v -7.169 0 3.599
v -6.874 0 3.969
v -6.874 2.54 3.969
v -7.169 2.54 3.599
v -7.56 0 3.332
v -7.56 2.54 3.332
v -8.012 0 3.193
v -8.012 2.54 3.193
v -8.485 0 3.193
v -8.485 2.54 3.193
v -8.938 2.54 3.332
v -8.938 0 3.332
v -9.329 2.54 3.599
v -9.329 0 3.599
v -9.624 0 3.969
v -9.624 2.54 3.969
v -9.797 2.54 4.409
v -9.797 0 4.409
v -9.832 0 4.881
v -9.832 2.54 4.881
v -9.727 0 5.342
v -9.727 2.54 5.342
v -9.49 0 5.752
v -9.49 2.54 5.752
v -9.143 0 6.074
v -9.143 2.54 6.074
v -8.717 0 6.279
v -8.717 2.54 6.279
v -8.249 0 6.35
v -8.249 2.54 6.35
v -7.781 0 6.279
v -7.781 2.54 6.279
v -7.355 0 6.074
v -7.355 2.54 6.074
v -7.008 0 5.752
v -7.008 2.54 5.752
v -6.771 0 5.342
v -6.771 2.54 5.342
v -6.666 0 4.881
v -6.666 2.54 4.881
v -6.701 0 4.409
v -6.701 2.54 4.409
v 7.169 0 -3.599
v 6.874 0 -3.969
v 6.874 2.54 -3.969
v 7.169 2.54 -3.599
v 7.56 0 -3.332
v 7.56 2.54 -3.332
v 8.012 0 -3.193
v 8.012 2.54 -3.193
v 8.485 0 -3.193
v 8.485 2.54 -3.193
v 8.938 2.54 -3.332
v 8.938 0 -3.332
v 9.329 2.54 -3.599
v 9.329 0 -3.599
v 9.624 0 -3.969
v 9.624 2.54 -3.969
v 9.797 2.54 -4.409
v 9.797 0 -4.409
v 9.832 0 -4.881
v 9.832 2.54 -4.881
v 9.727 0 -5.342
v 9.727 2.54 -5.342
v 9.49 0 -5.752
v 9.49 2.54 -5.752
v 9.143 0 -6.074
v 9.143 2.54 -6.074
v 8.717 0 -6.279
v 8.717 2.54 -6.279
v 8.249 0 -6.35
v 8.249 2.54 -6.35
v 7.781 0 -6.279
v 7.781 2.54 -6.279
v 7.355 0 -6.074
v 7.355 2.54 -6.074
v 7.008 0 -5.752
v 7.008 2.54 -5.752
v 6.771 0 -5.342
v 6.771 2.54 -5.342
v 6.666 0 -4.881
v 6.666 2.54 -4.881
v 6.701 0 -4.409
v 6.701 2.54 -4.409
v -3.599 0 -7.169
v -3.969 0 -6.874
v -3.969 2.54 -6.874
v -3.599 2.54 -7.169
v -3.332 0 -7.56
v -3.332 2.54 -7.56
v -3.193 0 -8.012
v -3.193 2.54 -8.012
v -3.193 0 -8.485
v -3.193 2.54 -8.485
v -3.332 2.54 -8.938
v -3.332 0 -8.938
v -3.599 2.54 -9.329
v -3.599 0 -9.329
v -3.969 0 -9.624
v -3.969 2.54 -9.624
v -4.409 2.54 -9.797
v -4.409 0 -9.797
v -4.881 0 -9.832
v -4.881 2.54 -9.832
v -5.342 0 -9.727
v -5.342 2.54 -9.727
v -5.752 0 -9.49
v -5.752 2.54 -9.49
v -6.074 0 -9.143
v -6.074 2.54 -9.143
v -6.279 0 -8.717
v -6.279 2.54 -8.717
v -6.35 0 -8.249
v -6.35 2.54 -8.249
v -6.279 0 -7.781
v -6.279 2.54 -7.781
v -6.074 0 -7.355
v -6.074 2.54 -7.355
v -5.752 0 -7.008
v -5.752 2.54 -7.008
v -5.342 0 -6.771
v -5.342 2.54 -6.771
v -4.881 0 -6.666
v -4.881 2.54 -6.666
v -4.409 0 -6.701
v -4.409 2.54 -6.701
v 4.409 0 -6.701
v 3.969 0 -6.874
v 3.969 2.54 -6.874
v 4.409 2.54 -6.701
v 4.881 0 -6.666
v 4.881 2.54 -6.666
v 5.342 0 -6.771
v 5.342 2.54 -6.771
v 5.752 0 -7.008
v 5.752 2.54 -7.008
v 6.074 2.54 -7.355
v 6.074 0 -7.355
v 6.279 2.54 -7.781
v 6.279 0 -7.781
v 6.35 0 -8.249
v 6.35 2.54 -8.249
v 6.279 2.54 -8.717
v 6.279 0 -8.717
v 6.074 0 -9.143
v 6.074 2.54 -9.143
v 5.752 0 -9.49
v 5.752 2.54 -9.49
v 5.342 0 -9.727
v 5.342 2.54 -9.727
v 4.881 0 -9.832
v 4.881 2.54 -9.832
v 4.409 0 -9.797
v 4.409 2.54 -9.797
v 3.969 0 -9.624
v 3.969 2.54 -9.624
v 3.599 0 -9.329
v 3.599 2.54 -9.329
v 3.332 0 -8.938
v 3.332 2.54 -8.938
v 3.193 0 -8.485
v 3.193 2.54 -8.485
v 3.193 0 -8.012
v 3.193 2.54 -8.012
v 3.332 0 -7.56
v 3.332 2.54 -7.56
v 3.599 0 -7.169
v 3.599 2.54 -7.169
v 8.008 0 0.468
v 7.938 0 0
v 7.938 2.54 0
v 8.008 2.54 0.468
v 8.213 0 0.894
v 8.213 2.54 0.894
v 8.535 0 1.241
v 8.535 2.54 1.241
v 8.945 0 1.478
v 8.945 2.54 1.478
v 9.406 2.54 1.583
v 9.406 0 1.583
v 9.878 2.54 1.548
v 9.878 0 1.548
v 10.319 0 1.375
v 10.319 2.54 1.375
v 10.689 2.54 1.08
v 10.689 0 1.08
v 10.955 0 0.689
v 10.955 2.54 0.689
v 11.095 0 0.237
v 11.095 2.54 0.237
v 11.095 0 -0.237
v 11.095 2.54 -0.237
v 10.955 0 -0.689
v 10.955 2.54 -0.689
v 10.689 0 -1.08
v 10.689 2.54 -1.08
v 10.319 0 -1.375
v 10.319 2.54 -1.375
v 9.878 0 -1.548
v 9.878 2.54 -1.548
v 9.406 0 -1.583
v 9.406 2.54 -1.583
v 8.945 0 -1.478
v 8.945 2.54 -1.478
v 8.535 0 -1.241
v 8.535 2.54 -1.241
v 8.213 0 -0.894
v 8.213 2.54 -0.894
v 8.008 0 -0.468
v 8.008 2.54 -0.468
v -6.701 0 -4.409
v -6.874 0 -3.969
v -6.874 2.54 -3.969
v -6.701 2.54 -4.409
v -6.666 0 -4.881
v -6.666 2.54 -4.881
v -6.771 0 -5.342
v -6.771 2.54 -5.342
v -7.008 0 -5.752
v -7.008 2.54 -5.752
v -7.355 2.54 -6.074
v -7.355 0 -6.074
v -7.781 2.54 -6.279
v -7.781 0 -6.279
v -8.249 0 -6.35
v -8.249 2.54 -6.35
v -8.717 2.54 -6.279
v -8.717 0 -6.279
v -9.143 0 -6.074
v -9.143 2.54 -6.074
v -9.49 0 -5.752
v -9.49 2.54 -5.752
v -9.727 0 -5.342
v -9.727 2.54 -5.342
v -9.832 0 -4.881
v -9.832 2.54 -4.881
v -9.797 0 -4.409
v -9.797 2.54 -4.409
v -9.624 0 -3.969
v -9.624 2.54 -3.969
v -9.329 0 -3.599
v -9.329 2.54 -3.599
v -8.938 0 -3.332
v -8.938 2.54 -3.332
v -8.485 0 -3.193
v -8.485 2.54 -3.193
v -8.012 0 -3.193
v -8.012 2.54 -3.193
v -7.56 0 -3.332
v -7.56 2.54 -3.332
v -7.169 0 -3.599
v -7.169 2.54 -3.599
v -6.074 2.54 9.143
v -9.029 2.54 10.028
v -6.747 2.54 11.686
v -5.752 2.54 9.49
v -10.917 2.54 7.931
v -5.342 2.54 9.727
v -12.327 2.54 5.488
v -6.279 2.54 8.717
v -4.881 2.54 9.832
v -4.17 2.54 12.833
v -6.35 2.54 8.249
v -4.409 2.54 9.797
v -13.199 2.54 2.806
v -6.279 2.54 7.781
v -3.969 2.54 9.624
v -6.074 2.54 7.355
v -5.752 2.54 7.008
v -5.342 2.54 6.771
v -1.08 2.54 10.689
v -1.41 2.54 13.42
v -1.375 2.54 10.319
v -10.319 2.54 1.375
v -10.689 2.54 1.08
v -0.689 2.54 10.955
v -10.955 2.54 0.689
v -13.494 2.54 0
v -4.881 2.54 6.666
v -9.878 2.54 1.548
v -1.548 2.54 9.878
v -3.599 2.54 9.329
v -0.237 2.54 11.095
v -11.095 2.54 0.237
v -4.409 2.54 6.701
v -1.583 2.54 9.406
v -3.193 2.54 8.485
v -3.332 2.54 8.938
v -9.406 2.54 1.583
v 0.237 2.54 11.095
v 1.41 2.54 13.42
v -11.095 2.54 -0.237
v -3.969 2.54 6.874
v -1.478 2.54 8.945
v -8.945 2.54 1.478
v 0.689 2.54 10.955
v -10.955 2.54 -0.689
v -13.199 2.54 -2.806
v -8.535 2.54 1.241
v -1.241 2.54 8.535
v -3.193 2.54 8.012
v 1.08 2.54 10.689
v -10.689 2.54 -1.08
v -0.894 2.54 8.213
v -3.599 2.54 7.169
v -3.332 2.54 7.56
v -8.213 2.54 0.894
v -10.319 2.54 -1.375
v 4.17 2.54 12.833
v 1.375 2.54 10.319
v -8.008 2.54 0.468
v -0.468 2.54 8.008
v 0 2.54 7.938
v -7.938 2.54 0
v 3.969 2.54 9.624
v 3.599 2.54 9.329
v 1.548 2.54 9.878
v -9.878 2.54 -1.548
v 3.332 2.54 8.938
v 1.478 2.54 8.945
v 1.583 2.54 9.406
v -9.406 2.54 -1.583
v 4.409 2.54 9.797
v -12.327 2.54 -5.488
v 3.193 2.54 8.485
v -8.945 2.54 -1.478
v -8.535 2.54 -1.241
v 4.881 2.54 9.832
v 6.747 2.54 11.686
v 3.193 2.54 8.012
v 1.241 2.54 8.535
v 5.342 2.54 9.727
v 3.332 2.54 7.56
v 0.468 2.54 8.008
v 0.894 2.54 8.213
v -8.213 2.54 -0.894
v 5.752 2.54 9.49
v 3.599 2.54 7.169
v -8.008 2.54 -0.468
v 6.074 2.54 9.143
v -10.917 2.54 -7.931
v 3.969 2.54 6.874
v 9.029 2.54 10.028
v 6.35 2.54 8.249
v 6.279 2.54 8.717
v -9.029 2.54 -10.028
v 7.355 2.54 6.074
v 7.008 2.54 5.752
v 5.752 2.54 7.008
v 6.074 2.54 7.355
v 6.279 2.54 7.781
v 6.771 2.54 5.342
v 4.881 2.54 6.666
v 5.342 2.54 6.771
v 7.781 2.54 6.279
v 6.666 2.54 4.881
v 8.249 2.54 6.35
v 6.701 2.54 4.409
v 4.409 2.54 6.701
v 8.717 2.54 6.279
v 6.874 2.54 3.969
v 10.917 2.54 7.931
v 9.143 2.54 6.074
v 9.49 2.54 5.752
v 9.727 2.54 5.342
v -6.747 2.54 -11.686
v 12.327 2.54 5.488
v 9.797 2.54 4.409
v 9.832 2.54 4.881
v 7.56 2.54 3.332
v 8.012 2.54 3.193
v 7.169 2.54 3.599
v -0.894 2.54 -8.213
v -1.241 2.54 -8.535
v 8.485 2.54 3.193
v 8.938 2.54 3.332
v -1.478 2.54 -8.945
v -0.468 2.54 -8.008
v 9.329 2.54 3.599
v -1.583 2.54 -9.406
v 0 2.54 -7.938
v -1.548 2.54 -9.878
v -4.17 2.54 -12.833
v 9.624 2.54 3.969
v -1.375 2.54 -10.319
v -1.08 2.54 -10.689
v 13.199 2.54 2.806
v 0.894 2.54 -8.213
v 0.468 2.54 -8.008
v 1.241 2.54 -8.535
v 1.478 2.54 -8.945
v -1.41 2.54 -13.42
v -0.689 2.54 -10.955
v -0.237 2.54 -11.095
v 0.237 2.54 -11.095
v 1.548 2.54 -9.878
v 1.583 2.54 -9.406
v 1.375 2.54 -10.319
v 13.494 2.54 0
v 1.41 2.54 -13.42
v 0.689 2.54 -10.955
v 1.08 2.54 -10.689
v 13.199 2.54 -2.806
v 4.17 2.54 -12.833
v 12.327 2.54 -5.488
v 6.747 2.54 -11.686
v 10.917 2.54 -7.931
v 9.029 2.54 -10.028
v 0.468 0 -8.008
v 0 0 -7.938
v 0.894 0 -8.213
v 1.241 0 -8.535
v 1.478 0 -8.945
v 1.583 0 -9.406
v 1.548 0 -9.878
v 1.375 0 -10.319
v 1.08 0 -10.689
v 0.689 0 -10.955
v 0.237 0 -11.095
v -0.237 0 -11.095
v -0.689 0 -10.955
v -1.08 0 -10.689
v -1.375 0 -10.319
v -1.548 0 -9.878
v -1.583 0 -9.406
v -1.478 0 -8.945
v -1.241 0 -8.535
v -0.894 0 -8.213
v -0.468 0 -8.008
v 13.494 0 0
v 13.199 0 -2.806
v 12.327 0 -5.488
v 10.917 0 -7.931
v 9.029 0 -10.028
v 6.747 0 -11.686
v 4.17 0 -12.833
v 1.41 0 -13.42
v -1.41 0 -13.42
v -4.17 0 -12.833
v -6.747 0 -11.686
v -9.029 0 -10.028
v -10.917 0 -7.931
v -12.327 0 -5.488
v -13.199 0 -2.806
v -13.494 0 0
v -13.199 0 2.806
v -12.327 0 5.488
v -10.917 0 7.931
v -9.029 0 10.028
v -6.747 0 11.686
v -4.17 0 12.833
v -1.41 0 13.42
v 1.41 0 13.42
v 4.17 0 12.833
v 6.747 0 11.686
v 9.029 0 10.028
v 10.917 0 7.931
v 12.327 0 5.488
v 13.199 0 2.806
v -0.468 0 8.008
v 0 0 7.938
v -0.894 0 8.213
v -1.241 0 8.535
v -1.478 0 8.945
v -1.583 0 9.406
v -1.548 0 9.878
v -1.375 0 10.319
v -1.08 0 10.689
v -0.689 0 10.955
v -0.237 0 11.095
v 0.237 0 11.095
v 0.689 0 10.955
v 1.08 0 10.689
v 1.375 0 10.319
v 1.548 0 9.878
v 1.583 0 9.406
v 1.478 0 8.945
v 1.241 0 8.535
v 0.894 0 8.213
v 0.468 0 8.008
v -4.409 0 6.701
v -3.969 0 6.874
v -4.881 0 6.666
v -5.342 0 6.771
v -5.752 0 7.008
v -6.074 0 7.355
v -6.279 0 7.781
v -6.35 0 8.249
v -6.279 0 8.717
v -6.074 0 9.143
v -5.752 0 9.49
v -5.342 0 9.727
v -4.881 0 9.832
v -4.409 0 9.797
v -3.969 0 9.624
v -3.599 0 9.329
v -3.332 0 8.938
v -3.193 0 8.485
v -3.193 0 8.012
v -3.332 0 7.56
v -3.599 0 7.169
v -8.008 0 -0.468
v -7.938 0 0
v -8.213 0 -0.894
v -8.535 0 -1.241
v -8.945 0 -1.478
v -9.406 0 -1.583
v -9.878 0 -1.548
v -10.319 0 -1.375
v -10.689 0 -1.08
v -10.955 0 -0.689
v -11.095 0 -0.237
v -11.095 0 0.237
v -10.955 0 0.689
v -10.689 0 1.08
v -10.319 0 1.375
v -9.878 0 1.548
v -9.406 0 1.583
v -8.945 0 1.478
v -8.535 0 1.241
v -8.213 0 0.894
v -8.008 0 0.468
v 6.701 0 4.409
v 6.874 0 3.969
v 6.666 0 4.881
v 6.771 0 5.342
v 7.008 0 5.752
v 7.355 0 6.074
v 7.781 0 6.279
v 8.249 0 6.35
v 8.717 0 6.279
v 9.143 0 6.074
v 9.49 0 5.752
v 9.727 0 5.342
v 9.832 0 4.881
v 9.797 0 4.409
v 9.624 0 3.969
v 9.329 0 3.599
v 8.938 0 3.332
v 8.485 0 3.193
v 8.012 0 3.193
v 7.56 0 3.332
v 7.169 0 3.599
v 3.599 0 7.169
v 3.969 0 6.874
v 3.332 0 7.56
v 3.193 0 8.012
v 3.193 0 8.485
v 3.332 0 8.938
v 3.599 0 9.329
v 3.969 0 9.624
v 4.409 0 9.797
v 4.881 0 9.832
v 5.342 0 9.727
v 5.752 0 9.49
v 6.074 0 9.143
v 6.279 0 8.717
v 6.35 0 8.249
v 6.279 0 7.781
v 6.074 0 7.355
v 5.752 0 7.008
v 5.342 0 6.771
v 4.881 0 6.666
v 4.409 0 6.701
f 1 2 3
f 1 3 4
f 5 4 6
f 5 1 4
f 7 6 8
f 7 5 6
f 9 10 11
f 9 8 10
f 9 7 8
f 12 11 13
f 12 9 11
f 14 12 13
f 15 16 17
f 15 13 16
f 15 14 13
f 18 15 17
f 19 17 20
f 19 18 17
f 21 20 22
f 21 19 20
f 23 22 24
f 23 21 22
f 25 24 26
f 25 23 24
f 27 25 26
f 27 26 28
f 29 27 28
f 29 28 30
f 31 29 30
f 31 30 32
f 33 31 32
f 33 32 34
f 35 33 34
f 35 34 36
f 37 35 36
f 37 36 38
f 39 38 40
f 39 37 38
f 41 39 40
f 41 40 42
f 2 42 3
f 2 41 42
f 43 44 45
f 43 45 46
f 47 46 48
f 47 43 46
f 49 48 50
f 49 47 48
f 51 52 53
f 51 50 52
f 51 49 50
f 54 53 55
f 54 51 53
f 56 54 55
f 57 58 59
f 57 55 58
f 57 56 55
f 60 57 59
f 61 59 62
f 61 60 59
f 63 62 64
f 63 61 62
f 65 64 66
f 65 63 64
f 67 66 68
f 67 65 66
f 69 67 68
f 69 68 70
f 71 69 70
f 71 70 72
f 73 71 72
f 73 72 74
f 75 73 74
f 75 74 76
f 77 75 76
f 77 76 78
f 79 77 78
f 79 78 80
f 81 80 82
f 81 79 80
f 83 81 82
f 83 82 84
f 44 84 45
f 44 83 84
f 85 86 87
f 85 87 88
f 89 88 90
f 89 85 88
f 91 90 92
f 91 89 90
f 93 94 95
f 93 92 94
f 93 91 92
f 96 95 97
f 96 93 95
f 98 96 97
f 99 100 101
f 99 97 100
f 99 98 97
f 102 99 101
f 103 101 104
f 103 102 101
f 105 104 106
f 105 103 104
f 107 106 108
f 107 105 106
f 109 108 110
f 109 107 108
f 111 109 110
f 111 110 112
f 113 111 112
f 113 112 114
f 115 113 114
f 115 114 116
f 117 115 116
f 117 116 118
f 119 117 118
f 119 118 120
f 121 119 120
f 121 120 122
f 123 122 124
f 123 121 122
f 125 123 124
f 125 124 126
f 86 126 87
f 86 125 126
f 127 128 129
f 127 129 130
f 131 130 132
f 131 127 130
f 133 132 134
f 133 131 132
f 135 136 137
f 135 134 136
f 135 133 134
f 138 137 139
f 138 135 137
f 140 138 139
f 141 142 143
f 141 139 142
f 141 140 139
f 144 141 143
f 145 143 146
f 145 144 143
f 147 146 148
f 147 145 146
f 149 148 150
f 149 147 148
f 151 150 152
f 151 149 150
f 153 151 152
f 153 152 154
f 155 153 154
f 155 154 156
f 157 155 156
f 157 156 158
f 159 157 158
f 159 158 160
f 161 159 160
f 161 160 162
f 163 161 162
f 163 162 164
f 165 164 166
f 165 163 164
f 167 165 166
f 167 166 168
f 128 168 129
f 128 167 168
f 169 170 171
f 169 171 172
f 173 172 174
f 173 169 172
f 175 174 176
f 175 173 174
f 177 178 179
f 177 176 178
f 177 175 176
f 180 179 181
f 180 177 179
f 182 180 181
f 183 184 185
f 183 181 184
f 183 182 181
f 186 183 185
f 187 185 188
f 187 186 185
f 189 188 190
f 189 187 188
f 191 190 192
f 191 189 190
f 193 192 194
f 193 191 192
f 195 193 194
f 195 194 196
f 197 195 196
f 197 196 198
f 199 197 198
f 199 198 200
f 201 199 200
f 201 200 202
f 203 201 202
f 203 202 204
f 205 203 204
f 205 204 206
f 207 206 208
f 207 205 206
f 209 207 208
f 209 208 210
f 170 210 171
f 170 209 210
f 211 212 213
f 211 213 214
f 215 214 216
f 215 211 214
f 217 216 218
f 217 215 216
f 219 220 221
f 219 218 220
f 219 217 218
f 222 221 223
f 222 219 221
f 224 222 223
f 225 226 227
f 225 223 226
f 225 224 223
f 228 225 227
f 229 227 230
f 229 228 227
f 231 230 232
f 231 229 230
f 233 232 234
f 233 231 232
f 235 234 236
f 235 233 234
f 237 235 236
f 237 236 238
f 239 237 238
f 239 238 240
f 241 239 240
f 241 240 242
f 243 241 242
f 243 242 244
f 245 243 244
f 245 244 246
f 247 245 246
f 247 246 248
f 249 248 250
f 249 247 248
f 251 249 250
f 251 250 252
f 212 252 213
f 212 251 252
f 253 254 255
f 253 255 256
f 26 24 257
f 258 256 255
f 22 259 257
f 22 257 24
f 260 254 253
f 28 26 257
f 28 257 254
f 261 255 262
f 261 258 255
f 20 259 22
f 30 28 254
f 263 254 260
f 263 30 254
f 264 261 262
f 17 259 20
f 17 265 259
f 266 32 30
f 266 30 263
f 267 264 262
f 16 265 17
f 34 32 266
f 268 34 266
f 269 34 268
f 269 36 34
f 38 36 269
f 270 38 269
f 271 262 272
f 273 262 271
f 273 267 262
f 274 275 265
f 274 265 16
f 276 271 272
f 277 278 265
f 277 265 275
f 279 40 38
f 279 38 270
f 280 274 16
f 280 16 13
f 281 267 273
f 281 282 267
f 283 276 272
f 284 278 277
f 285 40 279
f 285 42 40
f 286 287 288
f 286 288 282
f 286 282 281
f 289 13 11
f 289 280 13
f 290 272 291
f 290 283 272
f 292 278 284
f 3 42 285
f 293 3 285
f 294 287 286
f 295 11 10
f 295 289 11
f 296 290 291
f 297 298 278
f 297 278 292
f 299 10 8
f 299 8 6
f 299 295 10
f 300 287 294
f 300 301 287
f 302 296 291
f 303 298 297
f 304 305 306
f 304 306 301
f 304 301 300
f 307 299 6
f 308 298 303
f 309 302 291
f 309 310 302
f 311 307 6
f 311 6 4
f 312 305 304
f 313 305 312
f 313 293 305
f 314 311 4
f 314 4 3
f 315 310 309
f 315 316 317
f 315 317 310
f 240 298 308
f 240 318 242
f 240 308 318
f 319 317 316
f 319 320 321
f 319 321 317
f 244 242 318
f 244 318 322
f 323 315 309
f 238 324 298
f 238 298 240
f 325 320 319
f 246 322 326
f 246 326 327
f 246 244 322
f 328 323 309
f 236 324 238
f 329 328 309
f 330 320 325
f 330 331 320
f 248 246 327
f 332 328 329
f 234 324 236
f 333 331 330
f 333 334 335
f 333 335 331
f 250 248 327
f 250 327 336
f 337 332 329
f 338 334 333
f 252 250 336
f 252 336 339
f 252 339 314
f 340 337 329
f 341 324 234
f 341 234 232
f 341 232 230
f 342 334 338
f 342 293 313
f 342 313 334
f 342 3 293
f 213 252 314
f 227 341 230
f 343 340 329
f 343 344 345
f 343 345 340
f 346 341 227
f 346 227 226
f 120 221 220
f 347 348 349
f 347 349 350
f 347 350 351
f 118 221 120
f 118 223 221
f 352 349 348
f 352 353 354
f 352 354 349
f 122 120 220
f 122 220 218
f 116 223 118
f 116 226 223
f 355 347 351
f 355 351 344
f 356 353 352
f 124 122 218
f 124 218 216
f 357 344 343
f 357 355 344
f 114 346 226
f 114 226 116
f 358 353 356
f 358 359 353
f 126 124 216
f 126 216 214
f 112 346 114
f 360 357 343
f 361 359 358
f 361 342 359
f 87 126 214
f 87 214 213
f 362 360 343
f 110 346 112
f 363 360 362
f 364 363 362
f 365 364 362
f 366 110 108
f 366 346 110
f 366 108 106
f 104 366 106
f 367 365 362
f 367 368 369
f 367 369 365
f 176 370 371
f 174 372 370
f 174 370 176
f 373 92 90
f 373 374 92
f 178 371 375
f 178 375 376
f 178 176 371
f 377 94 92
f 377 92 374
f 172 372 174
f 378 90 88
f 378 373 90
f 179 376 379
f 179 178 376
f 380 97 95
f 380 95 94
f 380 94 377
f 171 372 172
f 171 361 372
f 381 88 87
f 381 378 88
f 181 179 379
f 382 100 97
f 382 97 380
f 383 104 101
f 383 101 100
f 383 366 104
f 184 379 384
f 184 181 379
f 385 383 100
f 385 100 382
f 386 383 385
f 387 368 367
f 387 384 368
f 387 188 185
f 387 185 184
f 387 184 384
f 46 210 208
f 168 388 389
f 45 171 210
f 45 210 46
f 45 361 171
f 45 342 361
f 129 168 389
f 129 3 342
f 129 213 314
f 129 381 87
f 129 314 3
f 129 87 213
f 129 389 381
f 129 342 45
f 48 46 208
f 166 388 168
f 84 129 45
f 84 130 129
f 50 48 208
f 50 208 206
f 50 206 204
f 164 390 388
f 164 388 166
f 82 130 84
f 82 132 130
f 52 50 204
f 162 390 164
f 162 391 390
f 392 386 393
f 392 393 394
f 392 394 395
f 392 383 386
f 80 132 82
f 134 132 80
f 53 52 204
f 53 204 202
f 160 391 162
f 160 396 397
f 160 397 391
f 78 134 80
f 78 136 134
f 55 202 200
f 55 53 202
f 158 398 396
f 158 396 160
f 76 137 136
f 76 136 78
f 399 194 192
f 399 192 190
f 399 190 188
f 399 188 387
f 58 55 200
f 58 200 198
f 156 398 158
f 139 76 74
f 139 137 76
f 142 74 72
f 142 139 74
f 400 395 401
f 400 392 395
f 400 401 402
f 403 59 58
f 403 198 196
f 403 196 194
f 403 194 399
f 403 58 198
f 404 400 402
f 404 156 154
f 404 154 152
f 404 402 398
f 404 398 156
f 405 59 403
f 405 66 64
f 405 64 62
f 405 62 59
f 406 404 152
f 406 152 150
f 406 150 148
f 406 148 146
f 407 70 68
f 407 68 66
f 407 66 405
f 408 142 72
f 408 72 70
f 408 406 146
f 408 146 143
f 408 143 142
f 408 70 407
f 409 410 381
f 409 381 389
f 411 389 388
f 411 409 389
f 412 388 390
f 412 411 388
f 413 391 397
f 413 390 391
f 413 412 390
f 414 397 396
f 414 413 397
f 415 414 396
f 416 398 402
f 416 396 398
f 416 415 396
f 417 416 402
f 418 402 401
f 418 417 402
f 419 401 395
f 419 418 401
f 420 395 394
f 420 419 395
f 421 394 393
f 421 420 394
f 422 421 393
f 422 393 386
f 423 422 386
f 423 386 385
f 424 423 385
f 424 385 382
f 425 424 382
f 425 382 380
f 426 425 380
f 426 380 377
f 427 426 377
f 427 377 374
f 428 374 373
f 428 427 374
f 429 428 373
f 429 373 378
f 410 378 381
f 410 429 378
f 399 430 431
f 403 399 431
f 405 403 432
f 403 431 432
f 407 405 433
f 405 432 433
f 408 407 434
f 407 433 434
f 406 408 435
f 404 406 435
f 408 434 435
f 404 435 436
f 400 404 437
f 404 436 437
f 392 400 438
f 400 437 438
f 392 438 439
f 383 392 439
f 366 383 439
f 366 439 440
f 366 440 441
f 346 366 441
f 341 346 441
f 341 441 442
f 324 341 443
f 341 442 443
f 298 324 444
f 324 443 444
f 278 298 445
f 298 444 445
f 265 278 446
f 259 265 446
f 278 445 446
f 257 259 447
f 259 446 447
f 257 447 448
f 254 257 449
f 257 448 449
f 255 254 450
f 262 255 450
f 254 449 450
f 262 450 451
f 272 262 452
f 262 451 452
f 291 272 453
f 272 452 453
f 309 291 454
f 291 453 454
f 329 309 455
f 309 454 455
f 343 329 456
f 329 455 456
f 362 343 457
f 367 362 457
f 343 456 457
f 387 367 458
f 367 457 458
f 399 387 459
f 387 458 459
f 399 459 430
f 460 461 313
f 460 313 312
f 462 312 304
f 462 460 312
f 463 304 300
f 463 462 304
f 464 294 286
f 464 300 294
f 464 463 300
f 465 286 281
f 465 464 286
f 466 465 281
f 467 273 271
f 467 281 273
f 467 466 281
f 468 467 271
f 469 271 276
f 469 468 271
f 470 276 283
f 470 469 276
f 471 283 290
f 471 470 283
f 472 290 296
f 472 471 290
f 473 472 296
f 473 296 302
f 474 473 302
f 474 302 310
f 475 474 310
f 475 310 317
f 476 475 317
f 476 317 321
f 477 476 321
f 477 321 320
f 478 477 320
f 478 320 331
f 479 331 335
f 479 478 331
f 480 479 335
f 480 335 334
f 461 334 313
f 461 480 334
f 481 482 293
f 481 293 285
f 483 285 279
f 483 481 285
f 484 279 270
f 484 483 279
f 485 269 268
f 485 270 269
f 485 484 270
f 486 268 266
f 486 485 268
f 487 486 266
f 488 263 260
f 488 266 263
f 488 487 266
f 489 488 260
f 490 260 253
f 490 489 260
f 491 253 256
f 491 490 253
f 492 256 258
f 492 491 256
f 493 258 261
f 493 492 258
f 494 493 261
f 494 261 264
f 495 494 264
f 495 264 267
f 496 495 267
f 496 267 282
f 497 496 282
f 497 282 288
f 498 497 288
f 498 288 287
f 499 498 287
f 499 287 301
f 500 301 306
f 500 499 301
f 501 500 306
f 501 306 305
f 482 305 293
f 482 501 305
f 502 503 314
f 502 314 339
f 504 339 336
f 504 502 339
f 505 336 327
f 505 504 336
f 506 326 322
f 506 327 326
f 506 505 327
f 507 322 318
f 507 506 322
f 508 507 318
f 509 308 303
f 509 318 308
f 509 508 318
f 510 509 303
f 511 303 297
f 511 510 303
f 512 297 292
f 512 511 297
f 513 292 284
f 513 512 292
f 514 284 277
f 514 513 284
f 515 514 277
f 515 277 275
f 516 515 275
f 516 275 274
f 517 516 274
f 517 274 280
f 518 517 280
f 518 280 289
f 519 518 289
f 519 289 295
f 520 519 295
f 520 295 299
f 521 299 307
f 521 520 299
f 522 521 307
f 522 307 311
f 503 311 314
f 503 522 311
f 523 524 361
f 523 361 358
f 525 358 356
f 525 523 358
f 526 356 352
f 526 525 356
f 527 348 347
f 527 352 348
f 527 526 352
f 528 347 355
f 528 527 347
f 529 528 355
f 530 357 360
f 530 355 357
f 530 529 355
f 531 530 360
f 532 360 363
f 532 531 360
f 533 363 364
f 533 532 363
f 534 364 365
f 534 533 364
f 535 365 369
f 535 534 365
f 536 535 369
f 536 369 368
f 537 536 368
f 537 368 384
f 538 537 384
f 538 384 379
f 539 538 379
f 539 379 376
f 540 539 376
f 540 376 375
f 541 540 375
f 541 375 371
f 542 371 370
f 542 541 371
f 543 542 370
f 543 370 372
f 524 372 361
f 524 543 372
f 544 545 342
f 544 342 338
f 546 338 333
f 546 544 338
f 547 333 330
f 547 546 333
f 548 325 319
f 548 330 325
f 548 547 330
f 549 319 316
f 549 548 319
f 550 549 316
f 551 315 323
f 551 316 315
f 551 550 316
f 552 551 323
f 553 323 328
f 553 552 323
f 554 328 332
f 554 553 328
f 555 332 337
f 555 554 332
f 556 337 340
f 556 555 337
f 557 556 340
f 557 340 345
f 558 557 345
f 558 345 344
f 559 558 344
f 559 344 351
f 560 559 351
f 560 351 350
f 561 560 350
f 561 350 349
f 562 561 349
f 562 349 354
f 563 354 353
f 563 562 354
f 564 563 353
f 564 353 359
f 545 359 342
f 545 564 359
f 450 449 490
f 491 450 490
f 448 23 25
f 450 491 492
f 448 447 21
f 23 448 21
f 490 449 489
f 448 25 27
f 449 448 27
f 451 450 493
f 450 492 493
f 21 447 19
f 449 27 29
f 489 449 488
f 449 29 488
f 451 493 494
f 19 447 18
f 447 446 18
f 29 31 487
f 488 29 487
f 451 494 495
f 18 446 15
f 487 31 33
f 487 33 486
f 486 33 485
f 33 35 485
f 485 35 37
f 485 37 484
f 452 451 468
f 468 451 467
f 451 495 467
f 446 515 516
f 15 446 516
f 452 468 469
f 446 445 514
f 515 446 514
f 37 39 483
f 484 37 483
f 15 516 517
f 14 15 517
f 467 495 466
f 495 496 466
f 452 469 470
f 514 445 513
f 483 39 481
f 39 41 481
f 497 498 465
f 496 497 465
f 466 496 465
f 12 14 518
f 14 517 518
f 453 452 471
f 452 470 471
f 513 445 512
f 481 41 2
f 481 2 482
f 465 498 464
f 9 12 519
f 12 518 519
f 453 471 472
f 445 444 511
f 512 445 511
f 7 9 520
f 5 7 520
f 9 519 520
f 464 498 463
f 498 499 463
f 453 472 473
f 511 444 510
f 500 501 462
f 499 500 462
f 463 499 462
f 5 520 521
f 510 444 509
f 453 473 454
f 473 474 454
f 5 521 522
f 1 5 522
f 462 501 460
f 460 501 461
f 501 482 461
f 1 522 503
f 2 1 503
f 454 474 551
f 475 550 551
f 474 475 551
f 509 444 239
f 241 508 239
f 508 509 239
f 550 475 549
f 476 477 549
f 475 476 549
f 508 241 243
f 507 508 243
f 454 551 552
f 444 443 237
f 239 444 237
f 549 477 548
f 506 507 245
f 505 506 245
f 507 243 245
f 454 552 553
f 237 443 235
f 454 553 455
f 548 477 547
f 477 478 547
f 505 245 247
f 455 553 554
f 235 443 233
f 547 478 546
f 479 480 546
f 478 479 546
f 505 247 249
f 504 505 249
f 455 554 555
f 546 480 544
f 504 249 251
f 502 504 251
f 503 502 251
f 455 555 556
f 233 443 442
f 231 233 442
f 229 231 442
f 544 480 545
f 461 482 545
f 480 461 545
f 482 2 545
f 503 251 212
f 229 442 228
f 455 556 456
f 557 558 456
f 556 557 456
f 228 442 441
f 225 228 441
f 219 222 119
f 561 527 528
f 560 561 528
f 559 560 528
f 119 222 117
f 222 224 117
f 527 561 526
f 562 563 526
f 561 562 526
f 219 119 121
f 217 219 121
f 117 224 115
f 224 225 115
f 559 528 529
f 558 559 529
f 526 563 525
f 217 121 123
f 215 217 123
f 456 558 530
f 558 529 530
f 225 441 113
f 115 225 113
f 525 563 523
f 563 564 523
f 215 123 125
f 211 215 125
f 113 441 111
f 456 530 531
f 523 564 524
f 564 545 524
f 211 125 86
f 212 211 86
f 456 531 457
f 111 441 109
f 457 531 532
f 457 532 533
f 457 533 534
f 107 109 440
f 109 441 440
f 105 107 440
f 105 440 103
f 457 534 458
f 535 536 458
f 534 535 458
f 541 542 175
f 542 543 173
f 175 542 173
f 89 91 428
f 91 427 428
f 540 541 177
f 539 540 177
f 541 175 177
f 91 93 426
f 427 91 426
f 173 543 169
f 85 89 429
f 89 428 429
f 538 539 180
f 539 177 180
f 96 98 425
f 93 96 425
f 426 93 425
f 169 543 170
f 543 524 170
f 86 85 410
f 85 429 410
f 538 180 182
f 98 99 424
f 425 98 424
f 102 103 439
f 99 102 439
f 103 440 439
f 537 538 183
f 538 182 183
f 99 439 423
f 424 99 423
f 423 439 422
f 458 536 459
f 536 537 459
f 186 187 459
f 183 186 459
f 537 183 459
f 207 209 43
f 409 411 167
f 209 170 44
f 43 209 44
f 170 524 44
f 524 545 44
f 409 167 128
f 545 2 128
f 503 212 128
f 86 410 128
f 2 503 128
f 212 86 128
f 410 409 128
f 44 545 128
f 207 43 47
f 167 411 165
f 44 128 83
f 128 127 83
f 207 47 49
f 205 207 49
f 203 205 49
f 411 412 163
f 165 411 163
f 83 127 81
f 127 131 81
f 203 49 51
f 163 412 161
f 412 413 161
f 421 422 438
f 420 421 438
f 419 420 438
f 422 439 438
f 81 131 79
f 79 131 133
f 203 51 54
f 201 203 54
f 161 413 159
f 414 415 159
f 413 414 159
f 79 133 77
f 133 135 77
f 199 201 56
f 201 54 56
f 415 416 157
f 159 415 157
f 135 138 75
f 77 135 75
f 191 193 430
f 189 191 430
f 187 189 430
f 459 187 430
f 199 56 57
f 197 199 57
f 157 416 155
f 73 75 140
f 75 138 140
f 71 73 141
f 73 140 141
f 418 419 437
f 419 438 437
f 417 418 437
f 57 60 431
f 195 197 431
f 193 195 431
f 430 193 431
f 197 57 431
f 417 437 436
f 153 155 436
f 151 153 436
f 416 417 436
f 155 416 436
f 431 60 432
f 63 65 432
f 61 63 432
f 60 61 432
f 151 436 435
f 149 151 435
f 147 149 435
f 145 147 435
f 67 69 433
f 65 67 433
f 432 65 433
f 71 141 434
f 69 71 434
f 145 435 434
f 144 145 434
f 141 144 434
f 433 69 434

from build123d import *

# Parameters (mm, degrees)
SKETCH1_R           = 13.49375
BOSS_EXTRUDE1_DEPTH = 2.54
CUT_EXTRUDE1_START  = -3.54
SKETCH2_R           = 1.5875
CUT_EXTRUDE1_DEPTH  = 4.54
CIRPATTERN1_COUNT   = 12


with BuildPart() as part:
    # Sketch1 → Boss-Extrude1 (new body)
    with BuildSketch(Plane(origin=(0, 0, 0), x_dir=(1, 0, 0), z_dir=(0, 1, 0))):
        Circle(SKETCH1_R)
    extrude(amount=BOSS_EXTRUDE1_DEPTH)

    # Sketch2 → Cut-Extrude1 (cut)
    with BuildSketch(Plane(origin=(0, 2.54, 0), x_dir=(1, 0, 0), z_dir=(0, 1, 0)).offset(CUT_EXTRUDE1_START)):
        with Locations((-9.525, 0)):
            Circle(SKETCH2_R)
    cut_extrude1 = extrude(amount=CUT_EXTRUDE1_DEPTH, mode=Mode.SUBTRACT)

    # CirPattern1: Cut-Extrude1 ×12 about axis
    cirpattern1_axis = Axis((0, 0, 0), (0, 1, 0))
    for i in range(1, CIRPATTERN1_COUNT):
        add(cut_extrude1.rotate(cirpattern1_axis, i * 360 / CIRPATTERN1_COUNT), mode=Mode.SUBTRACT)


solid = part.part
